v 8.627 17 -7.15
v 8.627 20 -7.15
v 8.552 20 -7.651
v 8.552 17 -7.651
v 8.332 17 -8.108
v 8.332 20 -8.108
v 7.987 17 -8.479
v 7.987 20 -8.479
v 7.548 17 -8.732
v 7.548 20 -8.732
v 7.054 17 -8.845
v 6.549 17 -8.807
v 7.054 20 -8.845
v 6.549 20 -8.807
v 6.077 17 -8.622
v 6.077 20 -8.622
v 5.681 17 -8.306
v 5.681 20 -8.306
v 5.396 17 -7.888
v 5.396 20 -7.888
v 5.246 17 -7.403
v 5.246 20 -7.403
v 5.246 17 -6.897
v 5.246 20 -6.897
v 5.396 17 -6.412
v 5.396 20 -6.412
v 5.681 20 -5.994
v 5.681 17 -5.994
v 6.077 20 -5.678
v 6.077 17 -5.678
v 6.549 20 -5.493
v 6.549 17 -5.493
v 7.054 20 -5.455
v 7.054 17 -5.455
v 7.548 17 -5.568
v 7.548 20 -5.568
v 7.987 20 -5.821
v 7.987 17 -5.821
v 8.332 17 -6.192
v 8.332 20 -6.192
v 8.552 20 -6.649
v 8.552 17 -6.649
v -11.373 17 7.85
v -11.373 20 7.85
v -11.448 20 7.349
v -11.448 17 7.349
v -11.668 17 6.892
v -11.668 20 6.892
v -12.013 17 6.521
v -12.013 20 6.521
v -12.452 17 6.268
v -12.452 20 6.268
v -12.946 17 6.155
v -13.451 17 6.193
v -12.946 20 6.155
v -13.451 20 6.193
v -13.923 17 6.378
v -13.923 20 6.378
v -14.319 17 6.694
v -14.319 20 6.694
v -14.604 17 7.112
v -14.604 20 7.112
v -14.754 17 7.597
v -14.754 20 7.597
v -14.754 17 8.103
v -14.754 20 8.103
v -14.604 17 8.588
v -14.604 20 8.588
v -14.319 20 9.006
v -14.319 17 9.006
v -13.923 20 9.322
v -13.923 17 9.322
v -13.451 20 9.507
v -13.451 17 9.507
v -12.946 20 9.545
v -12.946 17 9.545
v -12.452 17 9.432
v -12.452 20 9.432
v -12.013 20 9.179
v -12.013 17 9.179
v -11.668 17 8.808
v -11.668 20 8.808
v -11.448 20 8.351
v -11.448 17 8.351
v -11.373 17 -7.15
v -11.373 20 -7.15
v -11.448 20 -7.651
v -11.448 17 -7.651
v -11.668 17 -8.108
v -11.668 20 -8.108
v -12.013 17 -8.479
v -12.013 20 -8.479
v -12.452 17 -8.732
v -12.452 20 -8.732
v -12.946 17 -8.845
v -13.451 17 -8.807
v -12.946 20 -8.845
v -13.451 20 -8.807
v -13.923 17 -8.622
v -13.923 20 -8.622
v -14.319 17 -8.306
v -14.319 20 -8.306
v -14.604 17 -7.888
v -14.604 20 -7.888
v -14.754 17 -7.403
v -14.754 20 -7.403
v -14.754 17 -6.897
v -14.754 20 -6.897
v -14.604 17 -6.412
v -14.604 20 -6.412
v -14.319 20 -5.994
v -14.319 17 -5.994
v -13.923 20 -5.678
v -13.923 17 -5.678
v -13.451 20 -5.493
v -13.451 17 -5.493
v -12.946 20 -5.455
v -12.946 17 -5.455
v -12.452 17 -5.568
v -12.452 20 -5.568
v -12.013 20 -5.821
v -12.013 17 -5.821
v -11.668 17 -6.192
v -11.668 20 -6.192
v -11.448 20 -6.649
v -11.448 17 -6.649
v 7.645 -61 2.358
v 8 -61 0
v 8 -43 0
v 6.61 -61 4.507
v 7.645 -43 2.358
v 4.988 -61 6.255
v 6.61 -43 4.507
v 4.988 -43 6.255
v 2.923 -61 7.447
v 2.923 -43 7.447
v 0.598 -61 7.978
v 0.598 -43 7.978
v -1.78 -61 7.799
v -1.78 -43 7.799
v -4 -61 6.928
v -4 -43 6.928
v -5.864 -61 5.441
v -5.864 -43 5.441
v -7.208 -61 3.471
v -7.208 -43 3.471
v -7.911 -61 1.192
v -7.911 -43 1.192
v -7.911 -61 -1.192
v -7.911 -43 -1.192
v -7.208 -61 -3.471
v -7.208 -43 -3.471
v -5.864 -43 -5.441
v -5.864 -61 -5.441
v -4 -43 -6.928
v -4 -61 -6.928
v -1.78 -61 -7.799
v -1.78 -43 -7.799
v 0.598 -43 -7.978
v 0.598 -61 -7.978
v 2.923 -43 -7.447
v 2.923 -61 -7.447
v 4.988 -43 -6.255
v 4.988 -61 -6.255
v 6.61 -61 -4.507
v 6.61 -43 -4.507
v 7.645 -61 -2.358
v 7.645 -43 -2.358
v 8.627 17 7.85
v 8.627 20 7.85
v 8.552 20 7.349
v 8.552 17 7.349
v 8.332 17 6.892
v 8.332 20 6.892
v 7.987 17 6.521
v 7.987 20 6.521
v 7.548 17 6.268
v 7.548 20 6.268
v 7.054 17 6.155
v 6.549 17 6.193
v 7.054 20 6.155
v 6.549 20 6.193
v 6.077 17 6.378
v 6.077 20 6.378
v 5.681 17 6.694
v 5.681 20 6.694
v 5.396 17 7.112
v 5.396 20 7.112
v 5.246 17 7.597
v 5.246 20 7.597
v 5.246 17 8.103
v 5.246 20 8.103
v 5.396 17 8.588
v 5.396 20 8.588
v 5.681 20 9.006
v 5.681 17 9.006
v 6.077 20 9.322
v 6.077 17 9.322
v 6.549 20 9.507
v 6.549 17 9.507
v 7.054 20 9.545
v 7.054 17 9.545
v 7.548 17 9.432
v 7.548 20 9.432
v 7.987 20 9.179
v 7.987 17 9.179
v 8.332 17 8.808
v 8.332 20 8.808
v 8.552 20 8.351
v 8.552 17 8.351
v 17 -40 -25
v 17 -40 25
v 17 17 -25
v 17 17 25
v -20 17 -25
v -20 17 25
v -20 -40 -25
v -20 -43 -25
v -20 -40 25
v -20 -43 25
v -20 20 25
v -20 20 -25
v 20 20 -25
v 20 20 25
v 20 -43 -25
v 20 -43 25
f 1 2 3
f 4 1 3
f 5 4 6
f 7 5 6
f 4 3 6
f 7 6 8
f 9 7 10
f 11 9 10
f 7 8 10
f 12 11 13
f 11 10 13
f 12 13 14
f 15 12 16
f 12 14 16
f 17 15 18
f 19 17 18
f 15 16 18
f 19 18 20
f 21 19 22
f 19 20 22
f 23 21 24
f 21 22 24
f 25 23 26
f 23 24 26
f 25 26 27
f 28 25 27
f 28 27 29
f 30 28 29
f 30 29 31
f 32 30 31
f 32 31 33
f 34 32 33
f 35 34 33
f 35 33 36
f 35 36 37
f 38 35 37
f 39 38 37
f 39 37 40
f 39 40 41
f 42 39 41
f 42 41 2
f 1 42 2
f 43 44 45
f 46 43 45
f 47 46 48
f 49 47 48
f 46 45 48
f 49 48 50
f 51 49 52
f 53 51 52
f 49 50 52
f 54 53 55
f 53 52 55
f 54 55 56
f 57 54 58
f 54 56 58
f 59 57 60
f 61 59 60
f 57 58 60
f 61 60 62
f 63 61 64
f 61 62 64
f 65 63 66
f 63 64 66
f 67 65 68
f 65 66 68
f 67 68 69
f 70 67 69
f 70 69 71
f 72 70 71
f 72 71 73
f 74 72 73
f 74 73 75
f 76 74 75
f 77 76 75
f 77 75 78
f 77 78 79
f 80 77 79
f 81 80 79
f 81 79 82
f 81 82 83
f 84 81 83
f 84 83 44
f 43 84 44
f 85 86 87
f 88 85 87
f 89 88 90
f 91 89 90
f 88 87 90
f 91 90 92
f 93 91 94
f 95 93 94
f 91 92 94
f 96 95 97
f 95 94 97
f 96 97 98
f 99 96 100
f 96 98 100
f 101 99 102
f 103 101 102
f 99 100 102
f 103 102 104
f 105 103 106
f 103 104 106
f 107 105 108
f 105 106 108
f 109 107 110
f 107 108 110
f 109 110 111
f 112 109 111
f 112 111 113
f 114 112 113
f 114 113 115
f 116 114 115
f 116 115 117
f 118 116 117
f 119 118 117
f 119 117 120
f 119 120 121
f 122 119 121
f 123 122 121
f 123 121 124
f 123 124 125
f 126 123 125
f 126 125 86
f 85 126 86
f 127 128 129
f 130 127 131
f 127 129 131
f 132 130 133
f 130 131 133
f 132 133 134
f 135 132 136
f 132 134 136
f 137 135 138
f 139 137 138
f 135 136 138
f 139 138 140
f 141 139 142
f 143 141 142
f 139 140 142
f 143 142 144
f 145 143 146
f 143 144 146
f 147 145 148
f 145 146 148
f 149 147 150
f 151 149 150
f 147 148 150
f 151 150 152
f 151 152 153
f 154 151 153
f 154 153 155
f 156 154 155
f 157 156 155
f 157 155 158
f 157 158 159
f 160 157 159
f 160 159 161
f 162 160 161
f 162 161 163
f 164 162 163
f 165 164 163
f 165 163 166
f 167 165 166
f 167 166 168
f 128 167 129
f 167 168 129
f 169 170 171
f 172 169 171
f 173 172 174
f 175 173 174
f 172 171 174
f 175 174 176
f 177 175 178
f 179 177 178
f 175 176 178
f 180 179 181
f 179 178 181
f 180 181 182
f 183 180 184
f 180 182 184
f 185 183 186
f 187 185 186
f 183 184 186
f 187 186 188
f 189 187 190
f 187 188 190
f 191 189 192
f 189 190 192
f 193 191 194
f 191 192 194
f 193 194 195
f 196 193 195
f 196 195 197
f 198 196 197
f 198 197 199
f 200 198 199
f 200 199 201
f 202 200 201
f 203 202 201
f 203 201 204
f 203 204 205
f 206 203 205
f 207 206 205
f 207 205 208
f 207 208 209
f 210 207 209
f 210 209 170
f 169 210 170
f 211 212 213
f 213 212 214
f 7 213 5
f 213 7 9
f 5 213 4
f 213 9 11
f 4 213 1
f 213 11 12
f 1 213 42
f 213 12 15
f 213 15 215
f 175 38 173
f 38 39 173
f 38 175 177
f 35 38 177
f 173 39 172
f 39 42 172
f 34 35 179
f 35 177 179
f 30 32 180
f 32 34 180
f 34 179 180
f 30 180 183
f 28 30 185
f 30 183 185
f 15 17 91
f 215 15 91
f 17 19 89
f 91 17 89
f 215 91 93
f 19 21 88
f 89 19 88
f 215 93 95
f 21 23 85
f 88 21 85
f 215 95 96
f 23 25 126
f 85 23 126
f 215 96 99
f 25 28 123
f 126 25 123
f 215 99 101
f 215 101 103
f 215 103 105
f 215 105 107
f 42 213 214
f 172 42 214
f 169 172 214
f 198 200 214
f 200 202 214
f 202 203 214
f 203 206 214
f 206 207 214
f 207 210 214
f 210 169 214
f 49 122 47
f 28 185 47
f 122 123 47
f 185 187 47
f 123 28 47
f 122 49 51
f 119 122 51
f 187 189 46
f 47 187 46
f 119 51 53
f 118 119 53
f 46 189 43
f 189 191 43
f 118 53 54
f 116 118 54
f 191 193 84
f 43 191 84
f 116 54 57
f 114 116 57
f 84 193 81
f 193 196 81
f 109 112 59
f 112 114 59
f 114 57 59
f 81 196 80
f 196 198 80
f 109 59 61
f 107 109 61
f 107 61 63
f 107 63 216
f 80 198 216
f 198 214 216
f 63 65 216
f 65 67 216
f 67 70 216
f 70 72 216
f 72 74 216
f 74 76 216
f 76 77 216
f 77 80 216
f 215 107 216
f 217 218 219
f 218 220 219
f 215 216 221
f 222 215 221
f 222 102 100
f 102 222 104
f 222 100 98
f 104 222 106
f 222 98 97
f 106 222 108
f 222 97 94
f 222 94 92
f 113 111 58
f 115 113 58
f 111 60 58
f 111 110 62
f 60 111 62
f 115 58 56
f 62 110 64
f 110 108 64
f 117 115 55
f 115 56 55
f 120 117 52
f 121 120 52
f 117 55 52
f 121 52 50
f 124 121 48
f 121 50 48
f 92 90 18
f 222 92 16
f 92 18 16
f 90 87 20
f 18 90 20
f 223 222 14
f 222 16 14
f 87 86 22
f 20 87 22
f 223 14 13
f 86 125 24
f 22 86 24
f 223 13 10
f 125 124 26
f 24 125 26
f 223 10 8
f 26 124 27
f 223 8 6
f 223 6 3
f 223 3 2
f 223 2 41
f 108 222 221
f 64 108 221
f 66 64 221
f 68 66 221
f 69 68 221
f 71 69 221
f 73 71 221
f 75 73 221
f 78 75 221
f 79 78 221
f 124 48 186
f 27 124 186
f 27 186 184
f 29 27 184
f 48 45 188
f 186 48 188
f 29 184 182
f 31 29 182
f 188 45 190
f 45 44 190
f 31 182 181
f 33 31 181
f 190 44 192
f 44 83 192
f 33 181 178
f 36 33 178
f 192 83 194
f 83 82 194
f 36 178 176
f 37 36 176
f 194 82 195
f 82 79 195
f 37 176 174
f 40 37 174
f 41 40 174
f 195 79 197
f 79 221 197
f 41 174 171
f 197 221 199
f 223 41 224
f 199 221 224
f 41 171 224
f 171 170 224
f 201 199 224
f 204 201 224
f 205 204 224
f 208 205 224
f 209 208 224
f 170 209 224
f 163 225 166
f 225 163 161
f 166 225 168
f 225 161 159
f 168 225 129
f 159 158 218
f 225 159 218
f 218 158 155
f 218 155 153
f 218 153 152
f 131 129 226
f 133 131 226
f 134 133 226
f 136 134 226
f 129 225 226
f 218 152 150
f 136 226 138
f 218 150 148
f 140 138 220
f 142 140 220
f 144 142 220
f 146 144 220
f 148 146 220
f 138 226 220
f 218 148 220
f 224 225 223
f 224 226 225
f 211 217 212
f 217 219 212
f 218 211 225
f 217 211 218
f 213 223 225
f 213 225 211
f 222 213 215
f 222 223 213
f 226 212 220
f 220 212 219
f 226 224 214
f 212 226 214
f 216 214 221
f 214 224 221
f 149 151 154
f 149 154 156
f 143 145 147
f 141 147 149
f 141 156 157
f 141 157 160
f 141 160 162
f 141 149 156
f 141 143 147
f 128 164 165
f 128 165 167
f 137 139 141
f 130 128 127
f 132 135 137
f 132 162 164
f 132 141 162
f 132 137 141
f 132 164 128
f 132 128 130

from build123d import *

# Parameters (mm, degrees)
BOSS_EXTRUDE1_DEPTH       = 25
SKETCH3_R                 = 8
BOSS_EXTRUDE2_DEPTH       = 18
M3_CLEARANCE_HOLE1_REACH  = 89.098
M3_CLEARANCE_HOLE1_BORE_R = 1.7


with BuildPart() as part:
    # Sketch2 → Boss-Extrude1 (new, symmetric)
    with BuildSketch(Plane.XY):
        Polygon((-20, 20), (20, 20), (20, -40), (20, -43), (-20, -43), (-20, -40), (17, -40), (17, 17), (-20, 17), align=None)
    extrude(amount=BOSS_EXTRUDE1_DEPTH, both=True)

    # Sketch3 → Boss-Extrude2 (add)
    with BuildSketch(Plane.XZ.offset(43)):
        Circle(SKETCH3_R)
    extrude(amount=BOSS_EXTRUDE2_DEPTH)

    # M3 Clearance Hole1 bore → M3 Clearance Hole1 (cut, up to next)
    with BuildSketch(Plane(origin=(0, 20, 0), x_dir=(1, 0, 0), z_dir=(0, 1, 0)), mode=Mode.PRIVATE) as m3_clearance_hole1_sk1:
        with Locations((-13.072595628, -7.85)):
            Circle(M3_CLEARANCE_HOLE1_BORE_R)
    m3_clearance_hole1_tool1 = extrude(m3_clearance_hole1_sk1.sketch, amount=-M3_CLEARANCE_HOLE1_REACH, mode=Mode.PRIVATE) & part.part
    # M3 Clearance Hole1 bore → M3 Clearance Hole1 (cut, up to next)
    with BuildSketch(Plane(origin=(0, 20, 0), x_dir=(1, 0, 0), z_dir=(0, 1, 0)), mode=Mode.PRIVATE) as m3_clearance_hole1_sk2:
        with Locations((-13.072595628, 7.15)):
            Circle(M3_CLEARANCE_HOLE1_BORE_R)
    m3_clearance_hole1_tool2 = extrude(m3_clearance_hole1_sk2.sketch, amount=-M3_CLEARANCE_HOLE1_REACH, mode=Mode.PRIVATE) & part.part
    # M3 Clearance Hole1 bore → M3 Clearance Hole1 (cut, up to next)
    with BuildSketch(Plane(origin=(0, 20, 0), x_dir=(1, 0, 0), z_dir=(0, 1, 0)), mode=Mode.PRIVATE) as m3_clearance_hole1_sk3:
        with Locations((6.927404372, -7.85)):
            Circle(M3_CLEARANCE_HOLE1_BORE_R)
    m3_clearance_hole1_tool3 = extrude(m3_clearance_hole1_sk3.sketch, amount=-M3_CLEARANCE_HOLE1_REACH, mode=Mode.PRIVATE) & part.part
    # M3 Clearance Hole1 bore → M3 Clearance Hole1 (cut, up to next)
    with BuildSketch(Plane(origin=(0, 20, 0), x_dir=(1, 0, 0), z_dir=(0, 1, 0)), mode=Mode.PRIVATE) as m3_clearance_hole1_sk4:
        with Locations((6.927404372, 7.15)):
            Circle(M3_CLEARANCE_HOLE1_BORE_R)
    m3_clearance_hole1_tool4 = extrude(m3_clearance_hole1_sk4.sketch, amount=-M3_CLEARANCE_HOLE1_REACH, mode=Mode.PRIVATE) & part.part
    add(m3_clearance_hole1_tool1.solids().sort_by_distance((-13.072596, 20, 7.85))[0], mode=Mode.SUBTRACT)
    add(m3_clearance_hole1_tool2.solids().sort_by_distance((-13.072596, 20, -7.15))[0], mode=Mode.SUBTRACT)
    add(m3_clearance_hole1_tool3.solids().sort_by_distance((6.927404, 20, 7.85))[0], mode=Mode.SUBTRACT)
    add(m3_clearance_hole1_tool4.solids().sort_by_distance((6.927404, 20, -7.15))[0], mode=Mode.SUBTRACT)


solid = part.part
